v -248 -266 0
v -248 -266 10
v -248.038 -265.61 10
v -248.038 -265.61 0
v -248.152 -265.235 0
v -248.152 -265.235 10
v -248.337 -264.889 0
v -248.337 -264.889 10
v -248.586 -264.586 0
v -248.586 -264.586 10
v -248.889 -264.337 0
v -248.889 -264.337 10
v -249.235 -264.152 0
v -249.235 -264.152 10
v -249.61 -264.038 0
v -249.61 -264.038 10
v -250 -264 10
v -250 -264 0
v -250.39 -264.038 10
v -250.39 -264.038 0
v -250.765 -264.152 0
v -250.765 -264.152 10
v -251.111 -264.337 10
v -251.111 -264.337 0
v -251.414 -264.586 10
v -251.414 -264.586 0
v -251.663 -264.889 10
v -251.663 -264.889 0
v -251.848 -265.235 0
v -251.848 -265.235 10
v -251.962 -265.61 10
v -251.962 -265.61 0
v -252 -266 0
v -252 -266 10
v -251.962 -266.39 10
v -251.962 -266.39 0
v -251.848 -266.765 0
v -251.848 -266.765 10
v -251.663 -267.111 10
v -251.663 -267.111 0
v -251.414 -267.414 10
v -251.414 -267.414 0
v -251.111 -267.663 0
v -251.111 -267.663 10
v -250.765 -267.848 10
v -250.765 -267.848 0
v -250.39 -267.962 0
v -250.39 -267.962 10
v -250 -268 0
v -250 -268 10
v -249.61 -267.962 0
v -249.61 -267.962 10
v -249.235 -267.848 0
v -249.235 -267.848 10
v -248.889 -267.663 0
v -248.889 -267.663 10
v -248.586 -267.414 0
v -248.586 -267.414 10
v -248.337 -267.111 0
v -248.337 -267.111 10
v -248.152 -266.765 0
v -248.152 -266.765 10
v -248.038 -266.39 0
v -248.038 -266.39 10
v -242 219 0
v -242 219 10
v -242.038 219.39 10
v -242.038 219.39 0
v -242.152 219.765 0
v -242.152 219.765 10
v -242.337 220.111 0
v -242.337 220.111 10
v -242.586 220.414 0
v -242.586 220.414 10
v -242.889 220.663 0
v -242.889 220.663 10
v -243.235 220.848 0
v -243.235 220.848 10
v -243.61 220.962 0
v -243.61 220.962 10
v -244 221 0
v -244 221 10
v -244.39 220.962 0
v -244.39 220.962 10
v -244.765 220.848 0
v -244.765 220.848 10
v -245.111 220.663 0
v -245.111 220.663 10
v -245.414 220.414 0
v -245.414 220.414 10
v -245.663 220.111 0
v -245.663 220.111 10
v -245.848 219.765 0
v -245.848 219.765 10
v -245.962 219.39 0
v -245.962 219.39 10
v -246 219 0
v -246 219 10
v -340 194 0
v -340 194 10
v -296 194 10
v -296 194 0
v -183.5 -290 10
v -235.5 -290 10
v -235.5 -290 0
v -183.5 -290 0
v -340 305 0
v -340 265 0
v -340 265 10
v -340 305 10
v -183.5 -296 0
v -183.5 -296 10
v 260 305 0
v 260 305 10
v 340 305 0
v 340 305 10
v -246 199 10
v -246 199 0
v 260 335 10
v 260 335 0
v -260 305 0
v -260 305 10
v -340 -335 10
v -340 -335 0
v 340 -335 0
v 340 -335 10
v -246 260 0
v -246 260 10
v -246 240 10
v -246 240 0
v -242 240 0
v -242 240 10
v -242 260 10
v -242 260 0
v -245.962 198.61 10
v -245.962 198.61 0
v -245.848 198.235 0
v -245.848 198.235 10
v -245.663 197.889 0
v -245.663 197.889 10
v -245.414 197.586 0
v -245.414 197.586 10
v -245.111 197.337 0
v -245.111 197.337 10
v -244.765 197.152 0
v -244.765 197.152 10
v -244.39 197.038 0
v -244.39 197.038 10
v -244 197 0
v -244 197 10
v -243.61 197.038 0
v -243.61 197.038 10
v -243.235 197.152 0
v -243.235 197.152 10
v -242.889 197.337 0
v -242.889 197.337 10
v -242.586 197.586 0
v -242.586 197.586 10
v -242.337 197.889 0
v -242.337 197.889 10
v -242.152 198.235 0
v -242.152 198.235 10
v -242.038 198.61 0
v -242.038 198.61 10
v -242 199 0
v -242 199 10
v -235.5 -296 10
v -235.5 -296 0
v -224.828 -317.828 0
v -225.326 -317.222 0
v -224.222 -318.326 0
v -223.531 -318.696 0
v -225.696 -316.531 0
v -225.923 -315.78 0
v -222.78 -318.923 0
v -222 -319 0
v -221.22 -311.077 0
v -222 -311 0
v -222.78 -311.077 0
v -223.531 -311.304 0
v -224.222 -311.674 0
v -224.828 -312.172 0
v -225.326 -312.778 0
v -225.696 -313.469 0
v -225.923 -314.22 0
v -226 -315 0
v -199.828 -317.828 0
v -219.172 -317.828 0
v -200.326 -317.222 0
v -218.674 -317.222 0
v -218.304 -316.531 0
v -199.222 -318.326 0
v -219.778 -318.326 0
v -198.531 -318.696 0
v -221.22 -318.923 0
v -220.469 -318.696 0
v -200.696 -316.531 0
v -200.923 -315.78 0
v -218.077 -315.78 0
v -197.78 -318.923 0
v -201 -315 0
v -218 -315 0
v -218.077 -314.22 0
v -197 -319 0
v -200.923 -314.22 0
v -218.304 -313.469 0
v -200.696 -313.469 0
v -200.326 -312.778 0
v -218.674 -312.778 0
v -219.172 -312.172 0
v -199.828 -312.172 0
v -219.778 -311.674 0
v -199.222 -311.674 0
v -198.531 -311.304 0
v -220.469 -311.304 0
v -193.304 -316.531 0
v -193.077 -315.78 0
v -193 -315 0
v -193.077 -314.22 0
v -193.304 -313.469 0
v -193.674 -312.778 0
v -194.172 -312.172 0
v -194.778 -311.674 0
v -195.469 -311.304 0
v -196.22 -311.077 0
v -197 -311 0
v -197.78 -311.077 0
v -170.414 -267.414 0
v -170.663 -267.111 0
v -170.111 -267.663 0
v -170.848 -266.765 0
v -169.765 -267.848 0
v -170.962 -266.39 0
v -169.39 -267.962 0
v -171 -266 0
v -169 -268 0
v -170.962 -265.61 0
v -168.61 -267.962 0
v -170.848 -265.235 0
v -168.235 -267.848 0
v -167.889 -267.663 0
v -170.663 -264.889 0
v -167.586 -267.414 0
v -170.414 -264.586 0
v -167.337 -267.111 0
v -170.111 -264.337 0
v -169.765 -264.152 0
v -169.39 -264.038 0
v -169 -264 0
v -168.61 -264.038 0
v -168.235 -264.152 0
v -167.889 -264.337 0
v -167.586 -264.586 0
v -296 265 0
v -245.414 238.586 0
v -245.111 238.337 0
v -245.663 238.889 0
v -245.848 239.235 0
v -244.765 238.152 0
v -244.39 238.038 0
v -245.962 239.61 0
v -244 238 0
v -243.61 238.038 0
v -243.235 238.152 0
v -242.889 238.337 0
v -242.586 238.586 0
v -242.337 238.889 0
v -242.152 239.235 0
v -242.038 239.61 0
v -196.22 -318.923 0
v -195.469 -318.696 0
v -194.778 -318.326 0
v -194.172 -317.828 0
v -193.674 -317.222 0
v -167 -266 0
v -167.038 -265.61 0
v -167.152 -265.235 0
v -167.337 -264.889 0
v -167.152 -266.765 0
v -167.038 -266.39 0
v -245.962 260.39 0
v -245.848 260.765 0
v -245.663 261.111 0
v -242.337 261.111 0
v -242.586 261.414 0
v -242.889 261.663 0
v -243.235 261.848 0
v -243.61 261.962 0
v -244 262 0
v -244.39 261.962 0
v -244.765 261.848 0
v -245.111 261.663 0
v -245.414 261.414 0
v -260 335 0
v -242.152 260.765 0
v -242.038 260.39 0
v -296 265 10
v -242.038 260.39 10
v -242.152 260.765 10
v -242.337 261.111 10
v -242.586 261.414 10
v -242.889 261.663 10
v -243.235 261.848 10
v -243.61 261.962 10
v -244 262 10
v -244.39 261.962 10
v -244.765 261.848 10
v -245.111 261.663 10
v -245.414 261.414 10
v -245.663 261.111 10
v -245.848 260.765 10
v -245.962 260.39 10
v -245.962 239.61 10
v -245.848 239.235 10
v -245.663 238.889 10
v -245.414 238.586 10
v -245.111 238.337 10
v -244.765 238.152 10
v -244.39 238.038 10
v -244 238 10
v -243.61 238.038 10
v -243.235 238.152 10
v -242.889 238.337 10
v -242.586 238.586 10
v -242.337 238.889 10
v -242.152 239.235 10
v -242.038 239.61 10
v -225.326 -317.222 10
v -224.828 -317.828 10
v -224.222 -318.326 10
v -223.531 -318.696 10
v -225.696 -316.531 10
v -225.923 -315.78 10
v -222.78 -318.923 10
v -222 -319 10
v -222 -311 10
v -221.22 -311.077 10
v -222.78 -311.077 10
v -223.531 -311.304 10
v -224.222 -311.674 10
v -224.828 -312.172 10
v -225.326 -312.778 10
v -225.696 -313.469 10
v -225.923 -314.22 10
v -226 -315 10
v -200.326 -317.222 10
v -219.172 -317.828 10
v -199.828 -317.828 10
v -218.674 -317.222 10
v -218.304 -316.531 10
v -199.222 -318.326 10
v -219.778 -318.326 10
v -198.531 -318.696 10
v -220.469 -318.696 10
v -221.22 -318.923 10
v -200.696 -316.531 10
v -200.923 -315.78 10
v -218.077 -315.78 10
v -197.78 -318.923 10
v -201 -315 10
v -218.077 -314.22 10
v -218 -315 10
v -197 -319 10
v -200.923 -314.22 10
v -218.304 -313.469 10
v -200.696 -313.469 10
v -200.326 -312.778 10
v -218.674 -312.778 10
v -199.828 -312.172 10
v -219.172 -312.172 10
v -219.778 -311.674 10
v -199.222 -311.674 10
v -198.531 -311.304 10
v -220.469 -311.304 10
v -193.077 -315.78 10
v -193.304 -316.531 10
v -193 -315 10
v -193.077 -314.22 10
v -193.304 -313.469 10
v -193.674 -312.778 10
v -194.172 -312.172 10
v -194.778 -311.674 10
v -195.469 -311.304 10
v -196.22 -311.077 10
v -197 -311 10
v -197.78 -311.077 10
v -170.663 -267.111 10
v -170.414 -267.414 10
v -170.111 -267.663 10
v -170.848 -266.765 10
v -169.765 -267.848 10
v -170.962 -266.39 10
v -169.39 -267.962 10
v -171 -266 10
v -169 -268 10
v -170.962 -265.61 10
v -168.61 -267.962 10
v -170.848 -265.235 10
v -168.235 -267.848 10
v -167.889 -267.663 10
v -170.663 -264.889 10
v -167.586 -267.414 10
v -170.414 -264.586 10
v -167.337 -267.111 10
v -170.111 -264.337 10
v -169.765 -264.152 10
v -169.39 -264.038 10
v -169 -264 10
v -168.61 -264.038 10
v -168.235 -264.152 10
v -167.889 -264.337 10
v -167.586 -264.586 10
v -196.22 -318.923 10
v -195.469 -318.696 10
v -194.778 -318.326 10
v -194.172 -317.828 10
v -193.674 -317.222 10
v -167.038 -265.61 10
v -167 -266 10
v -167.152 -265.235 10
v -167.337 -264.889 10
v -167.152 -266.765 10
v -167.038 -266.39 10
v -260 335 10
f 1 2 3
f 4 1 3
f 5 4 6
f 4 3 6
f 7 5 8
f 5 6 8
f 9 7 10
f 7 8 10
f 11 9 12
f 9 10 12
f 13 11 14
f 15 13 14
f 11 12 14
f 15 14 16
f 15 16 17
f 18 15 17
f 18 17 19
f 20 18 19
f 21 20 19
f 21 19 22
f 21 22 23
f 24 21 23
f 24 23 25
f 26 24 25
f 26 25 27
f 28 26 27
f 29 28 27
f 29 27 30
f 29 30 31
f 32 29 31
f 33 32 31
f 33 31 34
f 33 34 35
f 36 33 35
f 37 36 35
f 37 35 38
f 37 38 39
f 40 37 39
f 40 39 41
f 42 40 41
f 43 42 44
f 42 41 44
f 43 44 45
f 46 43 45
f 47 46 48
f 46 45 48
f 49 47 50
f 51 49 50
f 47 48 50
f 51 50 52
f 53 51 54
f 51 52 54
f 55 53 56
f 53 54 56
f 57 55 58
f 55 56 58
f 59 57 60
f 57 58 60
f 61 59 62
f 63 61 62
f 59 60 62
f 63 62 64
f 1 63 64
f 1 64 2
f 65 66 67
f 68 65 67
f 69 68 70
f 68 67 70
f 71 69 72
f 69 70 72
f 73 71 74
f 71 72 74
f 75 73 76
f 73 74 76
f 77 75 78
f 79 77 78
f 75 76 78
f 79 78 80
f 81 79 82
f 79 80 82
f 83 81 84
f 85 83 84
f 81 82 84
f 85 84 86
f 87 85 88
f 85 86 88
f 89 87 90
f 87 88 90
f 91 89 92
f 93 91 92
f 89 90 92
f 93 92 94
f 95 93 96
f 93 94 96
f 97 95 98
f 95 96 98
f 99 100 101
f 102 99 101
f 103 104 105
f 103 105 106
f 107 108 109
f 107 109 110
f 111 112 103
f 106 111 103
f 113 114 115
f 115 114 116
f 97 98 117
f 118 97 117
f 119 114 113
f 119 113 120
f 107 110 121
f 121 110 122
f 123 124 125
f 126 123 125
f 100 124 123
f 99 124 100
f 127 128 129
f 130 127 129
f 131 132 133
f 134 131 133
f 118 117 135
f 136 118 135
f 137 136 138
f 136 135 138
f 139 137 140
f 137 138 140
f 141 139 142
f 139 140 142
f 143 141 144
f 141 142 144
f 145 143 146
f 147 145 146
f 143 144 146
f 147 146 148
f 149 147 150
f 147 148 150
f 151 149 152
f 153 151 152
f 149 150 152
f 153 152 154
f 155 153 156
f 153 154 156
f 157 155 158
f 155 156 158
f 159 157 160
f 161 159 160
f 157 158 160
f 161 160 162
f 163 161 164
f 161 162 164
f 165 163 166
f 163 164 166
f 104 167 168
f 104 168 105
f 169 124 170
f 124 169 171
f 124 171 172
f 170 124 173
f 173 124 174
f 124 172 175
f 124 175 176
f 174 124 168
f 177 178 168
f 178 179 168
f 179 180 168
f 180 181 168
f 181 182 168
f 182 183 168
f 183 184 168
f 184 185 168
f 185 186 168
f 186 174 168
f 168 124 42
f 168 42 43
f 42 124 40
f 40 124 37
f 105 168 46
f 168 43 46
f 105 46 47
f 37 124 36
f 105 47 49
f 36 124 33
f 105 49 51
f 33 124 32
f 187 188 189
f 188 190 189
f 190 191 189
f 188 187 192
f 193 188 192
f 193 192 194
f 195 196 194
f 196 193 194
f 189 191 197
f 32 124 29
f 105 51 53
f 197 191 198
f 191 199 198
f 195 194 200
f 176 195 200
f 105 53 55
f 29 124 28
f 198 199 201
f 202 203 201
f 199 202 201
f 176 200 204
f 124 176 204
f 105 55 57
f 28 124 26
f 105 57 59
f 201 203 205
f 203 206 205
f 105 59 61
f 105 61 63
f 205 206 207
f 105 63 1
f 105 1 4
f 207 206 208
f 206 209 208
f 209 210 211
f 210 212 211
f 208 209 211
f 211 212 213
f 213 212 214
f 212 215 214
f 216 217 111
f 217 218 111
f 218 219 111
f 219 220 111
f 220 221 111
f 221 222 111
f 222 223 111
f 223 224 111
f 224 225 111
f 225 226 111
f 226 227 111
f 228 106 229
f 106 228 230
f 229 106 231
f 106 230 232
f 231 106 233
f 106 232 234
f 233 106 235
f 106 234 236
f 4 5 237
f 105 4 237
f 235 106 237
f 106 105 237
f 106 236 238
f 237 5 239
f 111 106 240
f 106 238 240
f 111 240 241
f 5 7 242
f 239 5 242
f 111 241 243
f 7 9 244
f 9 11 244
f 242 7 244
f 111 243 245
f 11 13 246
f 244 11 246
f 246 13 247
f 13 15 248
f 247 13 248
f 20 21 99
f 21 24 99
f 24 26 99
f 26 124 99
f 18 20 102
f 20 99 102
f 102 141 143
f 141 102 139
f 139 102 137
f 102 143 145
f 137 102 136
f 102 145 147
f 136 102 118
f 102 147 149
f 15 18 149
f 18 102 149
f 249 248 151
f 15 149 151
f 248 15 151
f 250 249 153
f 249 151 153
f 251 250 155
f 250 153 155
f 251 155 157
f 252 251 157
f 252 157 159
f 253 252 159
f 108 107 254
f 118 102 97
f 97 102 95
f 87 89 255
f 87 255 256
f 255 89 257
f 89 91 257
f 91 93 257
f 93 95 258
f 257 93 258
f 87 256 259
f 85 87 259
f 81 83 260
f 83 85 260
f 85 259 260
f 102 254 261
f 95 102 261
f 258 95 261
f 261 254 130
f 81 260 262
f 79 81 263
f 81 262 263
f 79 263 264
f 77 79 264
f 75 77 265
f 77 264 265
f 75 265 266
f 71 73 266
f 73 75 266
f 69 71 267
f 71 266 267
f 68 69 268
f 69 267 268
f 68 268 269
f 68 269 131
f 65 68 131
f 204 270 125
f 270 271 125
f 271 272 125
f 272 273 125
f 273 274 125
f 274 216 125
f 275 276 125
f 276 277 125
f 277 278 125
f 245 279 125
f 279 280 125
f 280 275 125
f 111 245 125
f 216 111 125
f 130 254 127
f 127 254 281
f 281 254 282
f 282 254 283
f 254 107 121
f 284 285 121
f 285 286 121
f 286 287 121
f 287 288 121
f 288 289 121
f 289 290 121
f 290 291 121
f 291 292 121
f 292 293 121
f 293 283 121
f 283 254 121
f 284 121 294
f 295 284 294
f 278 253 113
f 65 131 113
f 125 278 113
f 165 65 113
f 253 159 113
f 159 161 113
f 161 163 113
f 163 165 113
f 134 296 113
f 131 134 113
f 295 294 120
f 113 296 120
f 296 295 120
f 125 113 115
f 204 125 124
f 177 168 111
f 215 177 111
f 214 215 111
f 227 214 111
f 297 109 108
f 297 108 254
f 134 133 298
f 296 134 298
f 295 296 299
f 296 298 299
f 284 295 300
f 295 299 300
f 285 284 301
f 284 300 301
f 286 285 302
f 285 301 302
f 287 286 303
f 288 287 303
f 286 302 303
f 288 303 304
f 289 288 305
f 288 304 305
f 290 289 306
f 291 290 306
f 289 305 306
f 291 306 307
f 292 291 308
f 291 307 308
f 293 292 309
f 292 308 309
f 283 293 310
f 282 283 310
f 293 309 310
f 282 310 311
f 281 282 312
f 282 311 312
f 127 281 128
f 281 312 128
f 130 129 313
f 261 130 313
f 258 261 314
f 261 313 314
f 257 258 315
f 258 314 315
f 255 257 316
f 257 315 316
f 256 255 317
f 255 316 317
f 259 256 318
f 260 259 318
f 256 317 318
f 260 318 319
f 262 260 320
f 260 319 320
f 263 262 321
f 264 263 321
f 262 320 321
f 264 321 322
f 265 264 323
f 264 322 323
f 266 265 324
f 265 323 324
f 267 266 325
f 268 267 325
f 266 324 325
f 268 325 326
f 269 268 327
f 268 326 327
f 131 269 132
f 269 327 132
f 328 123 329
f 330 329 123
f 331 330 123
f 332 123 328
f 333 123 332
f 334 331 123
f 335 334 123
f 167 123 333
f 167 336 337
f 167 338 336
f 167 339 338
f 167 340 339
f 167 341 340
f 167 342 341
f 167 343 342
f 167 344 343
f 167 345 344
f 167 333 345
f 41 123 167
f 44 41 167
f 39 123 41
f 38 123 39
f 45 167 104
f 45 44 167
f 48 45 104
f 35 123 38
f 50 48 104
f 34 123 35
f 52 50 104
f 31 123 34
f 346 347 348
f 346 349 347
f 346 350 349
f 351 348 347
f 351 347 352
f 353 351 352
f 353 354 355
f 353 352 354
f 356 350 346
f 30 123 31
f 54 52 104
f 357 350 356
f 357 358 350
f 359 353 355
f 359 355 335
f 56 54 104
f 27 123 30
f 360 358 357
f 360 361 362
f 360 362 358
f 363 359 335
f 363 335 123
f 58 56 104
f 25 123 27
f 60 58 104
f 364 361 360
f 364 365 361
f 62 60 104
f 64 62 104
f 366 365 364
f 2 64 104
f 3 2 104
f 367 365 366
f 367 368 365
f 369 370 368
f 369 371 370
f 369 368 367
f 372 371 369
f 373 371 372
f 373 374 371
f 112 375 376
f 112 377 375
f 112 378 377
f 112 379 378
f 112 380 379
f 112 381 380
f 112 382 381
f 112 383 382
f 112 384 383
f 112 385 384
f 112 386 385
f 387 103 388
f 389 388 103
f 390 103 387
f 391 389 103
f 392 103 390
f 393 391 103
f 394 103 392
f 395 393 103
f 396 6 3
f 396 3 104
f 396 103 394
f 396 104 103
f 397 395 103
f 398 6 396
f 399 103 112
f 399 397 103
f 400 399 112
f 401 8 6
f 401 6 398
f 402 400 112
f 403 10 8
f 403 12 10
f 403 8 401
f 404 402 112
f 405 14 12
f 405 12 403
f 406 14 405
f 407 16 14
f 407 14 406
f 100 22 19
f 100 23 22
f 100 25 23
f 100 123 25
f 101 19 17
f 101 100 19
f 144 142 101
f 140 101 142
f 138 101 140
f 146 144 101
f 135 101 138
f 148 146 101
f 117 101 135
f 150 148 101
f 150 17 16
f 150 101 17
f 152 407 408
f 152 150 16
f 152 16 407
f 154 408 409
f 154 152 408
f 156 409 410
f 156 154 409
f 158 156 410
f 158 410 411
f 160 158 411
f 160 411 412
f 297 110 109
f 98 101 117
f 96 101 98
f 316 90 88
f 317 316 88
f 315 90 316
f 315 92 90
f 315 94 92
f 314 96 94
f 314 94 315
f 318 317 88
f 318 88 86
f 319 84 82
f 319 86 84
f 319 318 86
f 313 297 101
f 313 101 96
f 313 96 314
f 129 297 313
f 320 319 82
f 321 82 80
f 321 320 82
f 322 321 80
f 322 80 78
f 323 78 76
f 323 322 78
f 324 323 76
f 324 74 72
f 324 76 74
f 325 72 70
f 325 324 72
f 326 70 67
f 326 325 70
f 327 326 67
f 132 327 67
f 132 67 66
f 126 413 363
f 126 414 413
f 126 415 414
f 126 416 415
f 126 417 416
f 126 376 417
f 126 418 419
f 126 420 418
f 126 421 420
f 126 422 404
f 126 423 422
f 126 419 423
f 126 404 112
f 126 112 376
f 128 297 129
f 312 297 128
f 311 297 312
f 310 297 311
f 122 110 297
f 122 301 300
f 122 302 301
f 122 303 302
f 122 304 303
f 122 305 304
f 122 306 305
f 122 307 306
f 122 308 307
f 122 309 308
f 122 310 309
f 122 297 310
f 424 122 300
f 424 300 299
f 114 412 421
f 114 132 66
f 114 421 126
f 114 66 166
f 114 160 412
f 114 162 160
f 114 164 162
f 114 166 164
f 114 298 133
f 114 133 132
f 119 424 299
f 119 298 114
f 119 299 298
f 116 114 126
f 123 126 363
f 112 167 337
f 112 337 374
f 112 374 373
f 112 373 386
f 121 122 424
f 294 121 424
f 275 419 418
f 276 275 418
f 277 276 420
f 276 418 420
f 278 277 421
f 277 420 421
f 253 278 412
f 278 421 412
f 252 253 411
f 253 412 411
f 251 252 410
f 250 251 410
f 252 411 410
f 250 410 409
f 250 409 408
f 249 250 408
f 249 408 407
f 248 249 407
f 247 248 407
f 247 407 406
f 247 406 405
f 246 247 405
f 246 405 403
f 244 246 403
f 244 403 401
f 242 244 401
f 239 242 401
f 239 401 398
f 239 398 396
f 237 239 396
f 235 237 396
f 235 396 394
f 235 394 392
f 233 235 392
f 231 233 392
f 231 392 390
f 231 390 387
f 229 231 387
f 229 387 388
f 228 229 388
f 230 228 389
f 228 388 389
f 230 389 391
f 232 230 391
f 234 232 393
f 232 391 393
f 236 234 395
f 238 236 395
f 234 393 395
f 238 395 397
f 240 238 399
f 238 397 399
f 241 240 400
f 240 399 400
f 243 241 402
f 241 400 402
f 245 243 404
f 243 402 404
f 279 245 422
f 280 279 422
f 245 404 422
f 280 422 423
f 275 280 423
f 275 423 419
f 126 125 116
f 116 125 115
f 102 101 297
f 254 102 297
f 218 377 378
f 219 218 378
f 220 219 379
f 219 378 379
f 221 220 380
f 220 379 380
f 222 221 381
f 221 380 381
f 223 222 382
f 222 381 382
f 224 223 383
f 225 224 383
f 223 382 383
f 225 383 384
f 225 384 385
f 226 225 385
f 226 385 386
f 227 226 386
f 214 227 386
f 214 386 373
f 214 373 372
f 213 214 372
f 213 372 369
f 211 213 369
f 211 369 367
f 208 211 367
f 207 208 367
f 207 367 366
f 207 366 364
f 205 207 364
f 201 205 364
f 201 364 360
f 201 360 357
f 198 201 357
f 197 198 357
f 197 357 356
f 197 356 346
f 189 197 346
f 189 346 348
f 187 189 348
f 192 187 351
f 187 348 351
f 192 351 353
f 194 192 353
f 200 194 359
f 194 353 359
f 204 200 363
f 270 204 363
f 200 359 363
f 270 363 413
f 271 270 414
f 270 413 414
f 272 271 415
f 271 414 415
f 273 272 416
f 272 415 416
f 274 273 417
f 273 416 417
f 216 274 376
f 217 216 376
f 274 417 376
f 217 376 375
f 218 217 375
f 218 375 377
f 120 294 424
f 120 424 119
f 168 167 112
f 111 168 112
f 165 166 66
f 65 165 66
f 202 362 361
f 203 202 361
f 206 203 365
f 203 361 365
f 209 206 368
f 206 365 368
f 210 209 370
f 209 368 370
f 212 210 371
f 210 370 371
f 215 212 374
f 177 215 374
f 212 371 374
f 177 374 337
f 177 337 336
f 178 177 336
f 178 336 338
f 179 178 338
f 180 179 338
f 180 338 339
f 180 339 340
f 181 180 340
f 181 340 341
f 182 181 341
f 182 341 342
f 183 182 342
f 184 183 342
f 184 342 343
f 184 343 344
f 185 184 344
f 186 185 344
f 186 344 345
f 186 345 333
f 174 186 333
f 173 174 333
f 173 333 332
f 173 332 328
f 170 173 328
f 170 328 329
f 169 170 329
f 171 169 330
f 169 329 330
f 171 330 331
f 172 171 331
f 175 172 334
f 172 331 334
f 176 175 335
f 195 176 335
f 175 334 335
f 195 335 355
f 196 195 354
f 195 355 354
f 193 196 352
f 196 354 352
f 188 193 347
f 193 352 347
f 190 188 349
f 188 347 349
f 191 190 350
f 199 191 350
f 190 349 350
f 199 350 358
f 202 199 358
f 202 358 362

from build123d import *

# Parameters (mm, degrees)
ESQUISSE1_W             = 680
ESQUISSE1_H             = 670
BOSS_EXTRU_1_DEPTH      = 10
ESQUISSE2_W             = 80
ESQUISSE2_H             = 30
ENL_V_MAT_EXTRU_1_DEPTH = 11
ESQUISSE3_W             = 52
ESQUISSE3_H             = 6
ENL_V_MAT_EXTRU_2_DEPTH = 11
ESQUISSE4_R             = 4
ENL_V_MAT_EXTRU_3_DEPTH = 11
ESQUISSE5_R             = 2
ENL_V_MAT_EXTRU_4_DEPTH = 11
ESQUISSE6_W             = 44
ESQUISSE6_H             = 71
ENL_V_MAT_EXTRU_5_DEPTH = 11
ENL_V_MAT_EXTRU_6_DEPTH = 11


with BuildPart() as part:
    # Esquisse1 → Boss.-Extru.1 (new body)
    with BuildSketch(Plane.XY):
        Rectangle(ESQUISSE1_W, ESQUISSE1_H)
    extrude(amount=BOSS_EXTRU_1_DEPTH)

    # Esquisse2 → Enlèv. mat.-Extru.1 (cut, through all)
    with BuildSketch(Plane.XY.offset(10)):
        with Locations((-300, 320)):
            Rectangle(ESQUISSE2_W, ESQUISSE2_H)
        with Locations((300, 320)):
            Rectangle(ESQUISSE2_W, ESQUISSE2_H)
    extrude(amount=-ENL_V_MAT_EXTRU_1_DEPTH, mode=Mode.SUBTRACT)

    # Esquisse3 → Enlèv. mat.-Extru.2 (cut, through all)
    with BuildSketch(Plane.XY.offset(10)):
        with Locations((-209.5, -293)):
            Rectangle(ESQUISSE3_W, ESQUISSE3_H)
    extrude(amount=-ENL_V_MAT_EXTRU_2_DEPTH, mode=Mode.SUBTRACT)

    # Esquisse4 → Enlèv. mat.-Extru.3 (cut, through all)
    with BuildSketch(Plane.XY.offset(10)):
        with Locations((-222, -315)):
            Circle(ESQUISSE4_R)
        with Locations((-197, -315)):
            Circle(ESQUISSE4_R)
    extrude(amount=-ENL_V_MAT_EXTRU_3_DEPTH, mode=Mode.SUBTRACT)

    # Esquisse5 → Enlèv. mat.-Extru.4 (cut, through all)
    with BuildSketch(Plane.XY.offset(10)):
        with Locations((-250, -266)):
            Circle(ESQUISSE5_R)
        with Locations((-169, -266)):
            Circle(ESQUISSE5_R)
    extrude(amount=-ENL_V_MAT_EXTRU_4_DEPTH, mode=Mode.SUBTRACT)

    # Esquisse6 → Enlèv. mat.-Extru.5 (cut, through all)
    with BuildSketch(Plane.XY.offset(10)):
        with Locations((-318, 229.5)):
            Rectangle(ESQUISSE6_W, ESQUISSE6_H)
    extrude(amount=-ENL_V_MAT_EXTRU_5_DEPTH, mode=Mode.SUBTRACT)

    # Esquisse7 → Enlèv. mat.-Extru.6 (cut, through all)
    with BuildSketch(Plane.XY.offset(10)):
        with BuildLine():
            Line((-246, 260), (-246, 240))
            ThreePointArc((-246, 240), (-244, 238), (-242, 240))
            Line((-242, 240), (-242, 260))
            ThreePointArc((-242, 260), (-244, 262), (-246, 260))
        make_face()
        with BuildLine():
            Line((-246, 219), (-246, 199))
            ThreePointArc((-246, 199), (-244, 197), (-242, 199))
            Line((-242, 199), (-242, 219))
            ThreePointArc((-242, 219), (-244, 221), (-246, 219))
        make_face()
    extrude(amount=-ENL_V_MAT_EXTRU_6_DEPTH, mode=Mode.SUBTRACT)


solid = part.part
